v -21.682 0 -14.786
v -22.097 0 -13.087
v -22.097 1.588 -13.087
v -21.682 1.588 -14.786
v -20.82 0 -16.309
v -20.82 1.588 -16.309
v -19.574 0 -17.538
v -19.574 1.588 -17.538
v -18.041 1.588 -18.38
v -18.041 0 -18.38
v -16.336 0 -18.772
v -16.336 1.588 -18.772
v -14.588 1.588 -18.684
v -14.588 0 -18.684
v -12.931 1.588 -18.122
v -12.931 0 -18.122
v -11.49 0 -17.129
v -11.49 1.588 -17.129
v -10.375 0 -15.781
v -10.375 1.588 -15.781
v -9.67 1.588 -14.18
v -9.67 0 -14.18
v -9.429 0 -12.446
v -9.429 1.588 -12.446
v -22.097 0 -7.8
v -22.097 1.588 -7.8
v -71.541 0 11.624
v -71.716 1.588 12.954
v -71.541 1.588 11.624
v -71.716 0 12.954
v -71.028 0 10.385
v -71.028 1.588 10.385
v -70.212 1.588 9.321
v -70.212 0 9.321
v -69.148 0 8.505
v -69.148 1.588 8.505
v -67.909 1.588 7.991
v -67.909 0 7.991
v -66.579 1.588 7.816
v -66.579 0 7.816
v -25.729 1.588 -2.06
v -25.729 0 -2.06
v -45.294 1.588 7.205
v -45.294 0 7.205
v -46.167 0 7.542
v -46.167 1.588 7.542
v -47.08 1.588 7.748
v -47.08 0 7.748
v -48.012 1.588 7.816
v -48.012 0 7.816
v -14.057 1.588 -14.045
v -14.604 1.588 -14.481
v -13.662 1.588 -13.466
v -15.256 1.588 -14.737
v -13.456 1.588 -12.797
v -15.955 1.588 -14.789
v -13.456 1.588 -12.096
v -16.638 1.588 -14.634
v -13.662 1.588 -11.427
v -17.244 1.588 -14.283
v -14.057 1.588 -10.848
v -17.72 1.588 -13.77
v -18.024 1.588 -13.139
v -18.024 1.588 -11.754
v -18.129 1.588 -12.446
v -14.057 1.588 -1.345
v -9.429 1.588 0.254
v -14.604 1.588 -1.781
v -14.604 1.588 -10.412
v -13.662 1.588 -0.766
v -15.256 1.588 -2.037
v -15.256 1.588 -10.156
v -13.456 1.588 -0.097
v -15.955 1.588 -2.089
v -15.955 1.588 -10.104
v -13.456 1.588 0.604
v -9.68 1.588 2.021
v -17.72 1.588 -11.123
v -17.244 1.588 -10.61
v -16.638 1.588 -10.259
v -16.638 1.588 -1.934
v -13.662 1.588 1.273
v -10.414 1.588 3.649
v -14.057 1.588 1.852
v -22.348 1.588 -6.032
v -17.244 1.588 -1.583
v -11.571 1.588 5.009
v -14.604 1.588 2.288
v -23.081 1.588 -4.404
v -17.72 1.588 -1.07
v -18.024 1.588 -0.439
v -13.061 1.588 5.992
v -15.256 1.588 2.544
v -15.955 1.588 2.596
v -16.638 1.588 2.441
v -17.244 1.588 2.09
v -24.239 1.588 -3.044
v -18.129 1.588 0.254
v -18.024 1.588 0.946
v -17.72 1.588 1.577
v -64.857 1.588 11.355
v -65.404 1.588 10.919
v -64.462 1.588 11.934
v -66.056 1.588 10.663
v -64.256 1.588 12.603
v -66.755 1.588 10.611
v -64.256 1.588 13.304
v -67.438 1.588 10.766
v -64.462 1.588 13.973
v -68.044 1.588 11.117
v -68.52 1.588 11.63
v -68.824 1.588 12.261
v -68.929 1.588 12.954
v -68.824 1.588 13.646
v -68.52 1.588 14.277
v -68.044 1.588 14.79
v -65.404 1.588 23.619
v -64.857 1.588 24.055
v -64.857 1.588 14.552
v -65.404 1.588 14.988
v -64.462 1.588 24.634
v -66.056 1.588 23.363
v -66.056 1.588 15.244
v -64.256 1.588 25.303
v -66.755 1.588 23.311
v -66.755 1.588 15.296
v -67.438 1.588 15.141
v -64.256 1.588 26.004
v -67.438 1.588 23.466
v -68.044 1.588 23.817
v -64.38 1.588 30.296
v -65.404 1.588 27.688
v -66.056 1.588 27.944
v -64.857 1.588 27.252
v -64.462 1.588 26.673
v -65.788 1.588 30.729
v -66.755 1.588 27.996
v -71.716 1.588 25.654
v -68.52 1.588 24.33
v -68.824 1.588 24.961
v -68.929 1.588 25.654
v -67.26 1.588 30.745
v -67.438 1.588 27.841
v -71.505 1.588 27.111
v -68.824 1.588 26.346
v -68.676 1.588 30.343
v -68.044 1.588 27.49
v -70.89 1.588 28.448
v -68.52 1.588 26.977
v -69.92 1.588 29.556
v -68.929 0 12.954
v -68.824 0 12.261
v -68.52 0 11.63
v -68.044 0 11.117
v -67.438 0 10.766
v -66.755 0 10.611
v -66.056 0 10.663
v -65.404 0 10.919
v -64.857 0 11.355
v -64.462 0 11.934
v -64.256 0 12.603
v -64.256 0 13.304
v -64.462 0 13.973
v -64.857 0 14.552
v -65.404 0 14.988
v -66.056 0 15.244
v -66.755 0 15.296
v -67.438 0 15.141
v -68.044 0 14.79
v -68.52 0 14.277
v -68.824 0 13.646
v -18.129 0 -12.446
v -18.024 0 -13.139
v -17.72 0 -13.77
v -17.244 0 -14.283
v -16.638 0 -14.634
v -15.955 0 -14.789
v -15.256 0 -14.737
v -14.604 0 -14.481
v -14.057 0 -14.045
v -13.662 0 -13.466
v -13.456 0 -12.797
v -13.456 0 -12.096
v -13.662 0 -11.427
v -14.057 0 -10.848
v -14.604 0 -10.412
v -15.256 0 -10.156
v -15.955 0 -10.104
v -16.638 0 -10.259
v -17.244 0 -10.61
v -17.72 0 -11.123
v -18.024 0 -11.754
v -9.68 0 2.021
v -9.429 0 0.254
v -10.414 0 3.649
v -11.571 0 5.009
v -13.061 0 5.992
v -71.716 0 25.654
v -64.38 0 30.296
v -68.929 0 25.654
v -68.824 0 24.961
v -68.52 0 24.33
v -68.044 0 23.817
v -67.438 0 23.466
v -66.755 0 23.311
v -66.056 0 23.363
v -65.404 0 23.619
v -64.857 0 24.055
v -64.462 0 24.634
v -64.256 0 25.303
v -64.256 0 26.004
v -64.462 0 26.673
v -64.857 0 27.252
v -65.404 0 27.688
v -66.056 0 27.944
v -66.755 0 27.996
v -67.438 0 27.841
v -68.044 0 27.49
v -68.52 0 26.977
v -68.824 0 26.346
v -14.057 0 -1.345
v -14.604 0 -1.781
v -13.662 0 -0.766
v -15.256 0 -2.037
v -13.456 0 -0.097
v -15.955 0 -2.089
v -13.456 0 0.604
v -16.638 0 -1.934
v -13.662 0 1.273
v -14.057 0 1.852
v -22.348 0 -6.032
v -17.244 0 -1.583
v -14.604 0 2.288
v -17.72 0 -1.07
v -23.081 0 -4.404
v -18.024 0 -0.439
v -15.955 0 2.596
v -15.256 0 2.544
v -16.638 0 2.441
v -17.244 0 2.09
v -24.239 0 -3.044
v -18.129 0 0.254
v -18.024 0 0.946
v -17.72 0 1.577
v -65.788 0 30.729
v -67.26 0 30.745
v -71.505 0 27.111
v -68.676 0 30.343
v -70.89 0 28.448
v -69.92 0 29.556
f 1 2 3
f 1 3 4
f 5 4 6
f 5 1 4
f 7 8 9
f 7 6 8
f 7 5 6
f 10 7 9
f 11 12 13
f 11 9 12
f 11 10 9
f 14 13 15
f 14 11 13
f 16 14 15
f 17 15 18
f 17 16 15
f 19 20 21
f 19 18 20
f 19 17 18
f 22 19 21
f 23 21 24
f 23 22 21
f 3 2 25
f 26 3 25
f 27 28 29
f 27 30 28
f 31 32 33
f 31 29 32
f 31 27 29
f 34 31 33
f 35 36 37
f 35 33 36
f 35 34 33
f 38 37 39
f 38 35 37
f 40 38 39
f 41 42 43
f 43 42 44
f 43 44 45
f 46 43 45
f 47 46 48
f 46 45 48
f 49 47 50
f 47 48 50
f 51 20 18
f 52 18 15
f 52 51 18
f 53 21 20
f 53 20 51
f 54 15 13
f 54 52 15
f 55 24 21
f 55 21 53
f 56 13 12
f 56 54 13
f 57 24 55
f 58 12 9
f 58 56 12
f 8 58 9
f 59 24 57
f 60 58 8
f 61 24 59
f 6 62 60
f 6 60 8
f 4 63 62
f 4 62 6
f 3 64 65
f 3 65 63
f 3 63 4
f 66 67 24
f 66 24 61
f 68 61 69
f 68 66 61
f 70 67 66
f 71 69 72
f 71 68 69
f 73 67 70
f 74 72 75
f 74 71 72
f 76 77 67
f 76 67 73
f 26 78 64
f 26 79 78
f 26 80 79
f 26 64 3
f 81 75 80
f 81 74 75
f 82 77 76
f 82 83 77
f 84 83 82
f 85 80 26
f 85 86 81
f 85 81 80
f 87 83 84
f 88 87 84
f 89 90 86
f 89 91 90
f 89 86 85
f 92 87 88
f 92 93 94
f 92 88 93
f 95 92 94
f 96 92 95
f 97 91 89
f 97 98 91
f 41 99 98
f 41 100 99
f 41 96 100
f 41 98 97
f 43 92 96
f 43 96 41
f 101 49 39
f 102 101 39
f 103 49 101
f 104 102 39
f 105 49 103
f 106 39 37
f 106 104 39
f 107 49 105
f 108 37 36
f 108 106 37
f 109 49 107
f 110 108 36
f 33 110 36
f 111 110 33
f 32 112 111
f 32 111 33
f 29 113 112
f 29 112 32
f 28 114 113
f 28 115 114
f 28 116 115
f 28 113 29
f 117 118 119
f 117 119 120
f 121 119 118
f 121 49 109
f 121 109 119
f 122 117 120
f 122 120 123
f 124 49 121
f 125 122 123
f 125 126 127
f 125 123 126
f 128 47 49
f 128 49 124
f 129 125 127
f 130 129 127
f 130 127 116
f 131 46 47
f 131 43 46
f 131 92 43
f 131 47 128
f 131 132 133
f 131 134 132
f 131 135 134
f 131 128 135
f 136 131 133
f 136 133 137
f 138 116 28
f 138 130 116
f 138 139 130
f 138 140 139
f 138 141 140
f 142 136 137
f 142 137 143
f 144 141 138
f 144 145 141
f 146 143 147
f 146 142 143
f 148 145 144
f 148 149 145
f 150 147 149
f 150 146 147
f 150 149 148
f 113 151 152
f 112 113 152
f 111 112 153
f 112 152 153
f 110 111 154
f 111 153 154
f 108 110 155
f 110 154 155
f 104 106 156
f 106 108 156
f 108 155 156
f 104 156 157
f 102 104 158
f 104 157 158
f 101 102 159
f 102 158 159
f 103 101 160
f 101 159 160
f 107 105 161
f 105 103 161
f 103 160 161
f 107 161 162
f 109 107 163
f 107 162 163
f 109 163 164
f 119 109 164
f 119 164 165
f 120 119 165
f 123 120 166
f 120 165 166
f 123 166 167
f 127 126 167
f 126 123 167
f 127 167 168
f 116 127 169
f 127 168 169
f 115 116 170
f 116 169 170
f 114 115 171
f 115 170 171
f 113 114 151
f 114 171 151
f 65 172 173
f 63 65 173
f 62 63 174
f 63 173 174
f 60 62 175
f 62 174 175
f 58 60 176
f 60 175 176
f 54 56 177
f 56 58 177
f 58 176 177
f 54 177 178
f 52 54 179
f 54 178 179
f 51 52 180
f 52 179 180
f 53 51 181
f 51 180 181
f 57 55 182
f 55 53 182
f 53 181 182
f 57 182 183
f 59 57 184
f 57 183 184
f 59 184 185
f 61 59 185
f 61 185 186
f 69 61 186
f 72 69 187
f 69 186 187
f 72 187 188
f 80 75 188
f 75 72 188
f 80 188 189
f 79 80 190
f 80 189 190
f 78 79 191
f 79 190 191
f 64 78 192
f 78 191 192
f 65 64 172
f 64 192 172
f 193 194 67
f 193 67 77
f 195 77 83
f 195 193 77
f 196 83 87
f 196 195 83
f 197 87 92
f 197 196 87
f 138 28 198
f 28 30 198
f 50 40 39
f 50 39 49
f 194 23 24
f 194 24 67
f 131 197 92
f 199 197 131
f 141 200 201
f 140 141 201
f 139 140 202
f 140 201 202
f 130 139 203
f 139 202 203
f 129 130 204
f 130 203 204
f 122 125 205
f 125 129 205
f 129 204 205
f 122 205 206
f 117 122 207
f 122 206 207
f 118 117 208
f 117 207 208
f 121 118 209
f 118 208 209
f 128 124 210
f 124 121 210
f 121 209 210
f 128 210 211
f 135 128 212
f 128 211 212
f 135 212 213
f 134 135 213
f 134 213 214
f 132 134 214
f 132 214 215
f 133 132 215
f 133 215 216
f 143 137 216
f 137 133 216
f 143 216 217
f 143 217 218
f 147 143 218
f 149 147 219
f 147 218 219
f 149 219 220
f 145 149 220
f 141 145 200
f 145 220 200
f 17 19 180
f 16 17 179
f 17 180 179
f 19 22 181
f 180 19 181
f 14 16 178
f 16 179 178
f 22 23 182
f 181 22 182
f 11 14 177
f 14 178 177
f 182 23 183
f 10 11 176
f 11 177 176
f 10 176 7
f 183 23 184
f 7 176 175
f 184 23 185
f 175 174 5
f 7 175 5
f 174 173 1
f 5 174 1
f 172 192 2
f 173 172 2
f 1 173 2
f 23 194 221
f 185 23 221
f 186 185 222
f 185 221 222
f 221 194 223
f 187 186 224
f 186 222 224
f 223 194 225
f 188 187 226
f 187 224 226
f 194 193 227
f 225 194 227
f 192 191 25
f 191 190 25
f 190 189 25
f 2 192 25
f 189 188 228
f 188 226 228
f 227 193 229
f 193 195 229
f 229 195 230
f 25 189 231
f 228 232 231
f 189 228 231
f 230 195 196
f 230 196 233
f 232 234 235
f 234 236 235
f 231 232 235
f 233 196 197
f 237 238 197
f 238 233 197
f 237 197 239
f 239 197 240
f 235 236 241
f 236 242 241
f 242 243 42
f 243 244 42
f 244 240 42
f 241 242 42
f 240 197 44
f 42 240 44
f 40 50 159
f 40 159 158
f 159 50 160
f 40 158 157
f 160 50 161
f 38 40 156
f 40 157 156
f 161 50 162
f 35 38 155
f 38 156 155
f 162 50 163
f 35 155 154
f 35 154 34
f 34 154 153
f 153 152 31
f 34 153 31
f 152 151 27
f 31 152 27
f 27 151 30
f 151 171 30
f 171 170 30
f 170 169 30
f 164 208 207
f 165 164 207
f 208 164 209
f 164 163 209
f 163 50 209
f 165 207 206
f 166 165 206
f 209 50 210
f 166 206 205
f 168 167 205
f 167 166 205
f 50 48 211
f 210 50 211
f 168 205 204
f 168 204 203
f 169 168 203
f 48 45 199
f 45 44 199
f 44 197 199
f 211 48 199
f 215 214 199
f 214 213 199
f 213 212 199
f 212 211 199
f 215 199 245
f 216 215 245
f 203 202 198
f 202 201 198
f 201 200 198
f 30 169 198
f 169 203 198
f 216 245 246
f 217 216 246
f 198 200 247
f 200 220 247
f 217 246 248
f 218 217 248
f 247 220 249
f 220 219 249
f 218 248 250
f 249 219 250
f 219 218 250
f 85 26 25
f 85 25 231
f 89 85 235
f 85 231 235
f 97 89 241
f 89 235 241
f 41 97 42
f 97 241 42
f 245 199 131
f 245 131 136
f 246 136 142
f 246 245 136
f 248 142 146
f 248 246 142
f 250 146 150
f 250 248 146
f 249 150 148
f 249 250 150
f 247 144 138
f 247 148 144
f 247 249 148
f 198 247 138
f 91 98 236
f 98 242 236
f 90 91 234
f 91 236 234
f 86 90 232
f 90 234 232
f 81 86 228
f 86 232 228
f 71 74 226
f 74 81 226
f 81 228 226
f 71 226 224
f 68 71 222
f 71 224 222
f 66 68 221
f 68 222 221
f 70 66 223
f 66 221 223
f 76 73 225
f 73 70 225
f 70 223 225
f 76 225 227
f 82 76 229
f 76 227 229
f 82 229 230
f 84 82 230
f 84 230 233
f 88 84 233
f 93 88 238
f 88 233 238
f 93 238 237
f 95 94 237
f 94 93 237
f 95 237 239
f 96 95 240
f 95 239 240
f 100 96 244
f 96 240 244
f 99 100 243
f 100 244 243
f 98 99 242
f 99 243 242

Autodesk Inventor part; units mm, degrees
ref_plane "YZ Plane" through (0, 0, 0) normal (1, 0, 0) x (0, 1, 0)
ref_plane "XZ Plane" through (0, 0, 0) normal (0, 1, 0) x (-1, 0, 0)
ref_plane "XY Plane" through (0, 0, 0) normal (0, 0, 1) x (1, 0, 0)
sketch "Sketch1" plane through (0, 0, 0) normal (0, 1, 0) x (-1, 0, 0)
  circle A0 centre (15.7792, 0.2535) radius 2.1844 construction
  circle A1 centre (66.5792, 25.6535) radius 2.1844 construction
  circle A2 centre (66.5792, 12.9535) radius 2.1844 construction
  circle A3 centre (15.7792, -12.4465) radius 2.1844 construction
  circle A4 centre (15.7792, -12.4465) radius 2.3495
  circle A5 centre (15.7792, 0.2535) radius 2.3495
  circle A6 centre (66.5792, 12.9535) radius 2.3495
  circle A7 centre (66.5792, 25.6535) radius 2.3495
  line L0 (71.7164, -18.7965) -> (71.7164, 32.0035) construction
  arc A8 (71.7164, 25.6535) -> (64.3805, 30.2964) centre (66.5792, 25.6535) ccw
  arc A9 (9.4292, -12.4465) -> (22.0969, -13.0866) centre (15.7792, -12.4465) ccw
  line L1 (71.7164, 12.9535) -> (71.7164, 25.6535)
  line L2 (9.4292, -12.4465) -> (9.4292, 0.2535)
  line L3 (13.0614, 5.9925) -> (64.3805, 30.2964)
  line L4 (66.5792, 7.8164) -> (48.0123, 7.8164)
  line L5 (25.729, -2.0605) -> (45.2945, 7.2054)
  line L6 (22.0969, -13.0866) -> (22.0969, -7.7995)
  arc A10 (13.0614, 5.9925) -> (9.4292, 0.2535) centre (15.7792, 0.2535) ccw
  arc A11 (66.5792, 7.8164) -> (71.7164, 12.9535) centre (66.5792, 12.9535) ccw
  arc A12 (48.0123, 7.8164) -> (45.2945, 7.2054) centre (48.0123, 1.4664) ccw
  arc A13 (25.729, -2.0605) -> (22.0969, -7.7995) centre (28.4469, -7.7995) ccw
  point P0 (0, 0)
  dimension "d0" = 4.699
  dimension "d1" = 4.699
  dimension "d2" = 4.699
  dimension "d3" = 4.699
  dimension "d5" = 12.7
  dimension "d7" = 6.35
  dimension "d8" = 6.35
  dimension "d9" = 12.7
extrude "Plate1" add sketch "Sketch1" along normal blind 1.5875
equation "\"d10\" = Thickness"
equation "\"BendRadius\" = Thickness"
equation "\"BendReliefWidth\" = Thickness"
equation "\"BendReliefDepth\" = 0.5 * Thickness"
equation "\"CornerReliefSize\" = 4 * Thickness"
equation "\"MinimumRemnant\" = 2 * Thickness"
equation "\"TransitionRadius\" = BendRadius"
equation "\"JacobiRadiusSize\" = BendRadius"
equation "\"GapSize\" = Thickness"
equation "\"Thickness\" = 1.5875"
properties part number "frontgussets"
